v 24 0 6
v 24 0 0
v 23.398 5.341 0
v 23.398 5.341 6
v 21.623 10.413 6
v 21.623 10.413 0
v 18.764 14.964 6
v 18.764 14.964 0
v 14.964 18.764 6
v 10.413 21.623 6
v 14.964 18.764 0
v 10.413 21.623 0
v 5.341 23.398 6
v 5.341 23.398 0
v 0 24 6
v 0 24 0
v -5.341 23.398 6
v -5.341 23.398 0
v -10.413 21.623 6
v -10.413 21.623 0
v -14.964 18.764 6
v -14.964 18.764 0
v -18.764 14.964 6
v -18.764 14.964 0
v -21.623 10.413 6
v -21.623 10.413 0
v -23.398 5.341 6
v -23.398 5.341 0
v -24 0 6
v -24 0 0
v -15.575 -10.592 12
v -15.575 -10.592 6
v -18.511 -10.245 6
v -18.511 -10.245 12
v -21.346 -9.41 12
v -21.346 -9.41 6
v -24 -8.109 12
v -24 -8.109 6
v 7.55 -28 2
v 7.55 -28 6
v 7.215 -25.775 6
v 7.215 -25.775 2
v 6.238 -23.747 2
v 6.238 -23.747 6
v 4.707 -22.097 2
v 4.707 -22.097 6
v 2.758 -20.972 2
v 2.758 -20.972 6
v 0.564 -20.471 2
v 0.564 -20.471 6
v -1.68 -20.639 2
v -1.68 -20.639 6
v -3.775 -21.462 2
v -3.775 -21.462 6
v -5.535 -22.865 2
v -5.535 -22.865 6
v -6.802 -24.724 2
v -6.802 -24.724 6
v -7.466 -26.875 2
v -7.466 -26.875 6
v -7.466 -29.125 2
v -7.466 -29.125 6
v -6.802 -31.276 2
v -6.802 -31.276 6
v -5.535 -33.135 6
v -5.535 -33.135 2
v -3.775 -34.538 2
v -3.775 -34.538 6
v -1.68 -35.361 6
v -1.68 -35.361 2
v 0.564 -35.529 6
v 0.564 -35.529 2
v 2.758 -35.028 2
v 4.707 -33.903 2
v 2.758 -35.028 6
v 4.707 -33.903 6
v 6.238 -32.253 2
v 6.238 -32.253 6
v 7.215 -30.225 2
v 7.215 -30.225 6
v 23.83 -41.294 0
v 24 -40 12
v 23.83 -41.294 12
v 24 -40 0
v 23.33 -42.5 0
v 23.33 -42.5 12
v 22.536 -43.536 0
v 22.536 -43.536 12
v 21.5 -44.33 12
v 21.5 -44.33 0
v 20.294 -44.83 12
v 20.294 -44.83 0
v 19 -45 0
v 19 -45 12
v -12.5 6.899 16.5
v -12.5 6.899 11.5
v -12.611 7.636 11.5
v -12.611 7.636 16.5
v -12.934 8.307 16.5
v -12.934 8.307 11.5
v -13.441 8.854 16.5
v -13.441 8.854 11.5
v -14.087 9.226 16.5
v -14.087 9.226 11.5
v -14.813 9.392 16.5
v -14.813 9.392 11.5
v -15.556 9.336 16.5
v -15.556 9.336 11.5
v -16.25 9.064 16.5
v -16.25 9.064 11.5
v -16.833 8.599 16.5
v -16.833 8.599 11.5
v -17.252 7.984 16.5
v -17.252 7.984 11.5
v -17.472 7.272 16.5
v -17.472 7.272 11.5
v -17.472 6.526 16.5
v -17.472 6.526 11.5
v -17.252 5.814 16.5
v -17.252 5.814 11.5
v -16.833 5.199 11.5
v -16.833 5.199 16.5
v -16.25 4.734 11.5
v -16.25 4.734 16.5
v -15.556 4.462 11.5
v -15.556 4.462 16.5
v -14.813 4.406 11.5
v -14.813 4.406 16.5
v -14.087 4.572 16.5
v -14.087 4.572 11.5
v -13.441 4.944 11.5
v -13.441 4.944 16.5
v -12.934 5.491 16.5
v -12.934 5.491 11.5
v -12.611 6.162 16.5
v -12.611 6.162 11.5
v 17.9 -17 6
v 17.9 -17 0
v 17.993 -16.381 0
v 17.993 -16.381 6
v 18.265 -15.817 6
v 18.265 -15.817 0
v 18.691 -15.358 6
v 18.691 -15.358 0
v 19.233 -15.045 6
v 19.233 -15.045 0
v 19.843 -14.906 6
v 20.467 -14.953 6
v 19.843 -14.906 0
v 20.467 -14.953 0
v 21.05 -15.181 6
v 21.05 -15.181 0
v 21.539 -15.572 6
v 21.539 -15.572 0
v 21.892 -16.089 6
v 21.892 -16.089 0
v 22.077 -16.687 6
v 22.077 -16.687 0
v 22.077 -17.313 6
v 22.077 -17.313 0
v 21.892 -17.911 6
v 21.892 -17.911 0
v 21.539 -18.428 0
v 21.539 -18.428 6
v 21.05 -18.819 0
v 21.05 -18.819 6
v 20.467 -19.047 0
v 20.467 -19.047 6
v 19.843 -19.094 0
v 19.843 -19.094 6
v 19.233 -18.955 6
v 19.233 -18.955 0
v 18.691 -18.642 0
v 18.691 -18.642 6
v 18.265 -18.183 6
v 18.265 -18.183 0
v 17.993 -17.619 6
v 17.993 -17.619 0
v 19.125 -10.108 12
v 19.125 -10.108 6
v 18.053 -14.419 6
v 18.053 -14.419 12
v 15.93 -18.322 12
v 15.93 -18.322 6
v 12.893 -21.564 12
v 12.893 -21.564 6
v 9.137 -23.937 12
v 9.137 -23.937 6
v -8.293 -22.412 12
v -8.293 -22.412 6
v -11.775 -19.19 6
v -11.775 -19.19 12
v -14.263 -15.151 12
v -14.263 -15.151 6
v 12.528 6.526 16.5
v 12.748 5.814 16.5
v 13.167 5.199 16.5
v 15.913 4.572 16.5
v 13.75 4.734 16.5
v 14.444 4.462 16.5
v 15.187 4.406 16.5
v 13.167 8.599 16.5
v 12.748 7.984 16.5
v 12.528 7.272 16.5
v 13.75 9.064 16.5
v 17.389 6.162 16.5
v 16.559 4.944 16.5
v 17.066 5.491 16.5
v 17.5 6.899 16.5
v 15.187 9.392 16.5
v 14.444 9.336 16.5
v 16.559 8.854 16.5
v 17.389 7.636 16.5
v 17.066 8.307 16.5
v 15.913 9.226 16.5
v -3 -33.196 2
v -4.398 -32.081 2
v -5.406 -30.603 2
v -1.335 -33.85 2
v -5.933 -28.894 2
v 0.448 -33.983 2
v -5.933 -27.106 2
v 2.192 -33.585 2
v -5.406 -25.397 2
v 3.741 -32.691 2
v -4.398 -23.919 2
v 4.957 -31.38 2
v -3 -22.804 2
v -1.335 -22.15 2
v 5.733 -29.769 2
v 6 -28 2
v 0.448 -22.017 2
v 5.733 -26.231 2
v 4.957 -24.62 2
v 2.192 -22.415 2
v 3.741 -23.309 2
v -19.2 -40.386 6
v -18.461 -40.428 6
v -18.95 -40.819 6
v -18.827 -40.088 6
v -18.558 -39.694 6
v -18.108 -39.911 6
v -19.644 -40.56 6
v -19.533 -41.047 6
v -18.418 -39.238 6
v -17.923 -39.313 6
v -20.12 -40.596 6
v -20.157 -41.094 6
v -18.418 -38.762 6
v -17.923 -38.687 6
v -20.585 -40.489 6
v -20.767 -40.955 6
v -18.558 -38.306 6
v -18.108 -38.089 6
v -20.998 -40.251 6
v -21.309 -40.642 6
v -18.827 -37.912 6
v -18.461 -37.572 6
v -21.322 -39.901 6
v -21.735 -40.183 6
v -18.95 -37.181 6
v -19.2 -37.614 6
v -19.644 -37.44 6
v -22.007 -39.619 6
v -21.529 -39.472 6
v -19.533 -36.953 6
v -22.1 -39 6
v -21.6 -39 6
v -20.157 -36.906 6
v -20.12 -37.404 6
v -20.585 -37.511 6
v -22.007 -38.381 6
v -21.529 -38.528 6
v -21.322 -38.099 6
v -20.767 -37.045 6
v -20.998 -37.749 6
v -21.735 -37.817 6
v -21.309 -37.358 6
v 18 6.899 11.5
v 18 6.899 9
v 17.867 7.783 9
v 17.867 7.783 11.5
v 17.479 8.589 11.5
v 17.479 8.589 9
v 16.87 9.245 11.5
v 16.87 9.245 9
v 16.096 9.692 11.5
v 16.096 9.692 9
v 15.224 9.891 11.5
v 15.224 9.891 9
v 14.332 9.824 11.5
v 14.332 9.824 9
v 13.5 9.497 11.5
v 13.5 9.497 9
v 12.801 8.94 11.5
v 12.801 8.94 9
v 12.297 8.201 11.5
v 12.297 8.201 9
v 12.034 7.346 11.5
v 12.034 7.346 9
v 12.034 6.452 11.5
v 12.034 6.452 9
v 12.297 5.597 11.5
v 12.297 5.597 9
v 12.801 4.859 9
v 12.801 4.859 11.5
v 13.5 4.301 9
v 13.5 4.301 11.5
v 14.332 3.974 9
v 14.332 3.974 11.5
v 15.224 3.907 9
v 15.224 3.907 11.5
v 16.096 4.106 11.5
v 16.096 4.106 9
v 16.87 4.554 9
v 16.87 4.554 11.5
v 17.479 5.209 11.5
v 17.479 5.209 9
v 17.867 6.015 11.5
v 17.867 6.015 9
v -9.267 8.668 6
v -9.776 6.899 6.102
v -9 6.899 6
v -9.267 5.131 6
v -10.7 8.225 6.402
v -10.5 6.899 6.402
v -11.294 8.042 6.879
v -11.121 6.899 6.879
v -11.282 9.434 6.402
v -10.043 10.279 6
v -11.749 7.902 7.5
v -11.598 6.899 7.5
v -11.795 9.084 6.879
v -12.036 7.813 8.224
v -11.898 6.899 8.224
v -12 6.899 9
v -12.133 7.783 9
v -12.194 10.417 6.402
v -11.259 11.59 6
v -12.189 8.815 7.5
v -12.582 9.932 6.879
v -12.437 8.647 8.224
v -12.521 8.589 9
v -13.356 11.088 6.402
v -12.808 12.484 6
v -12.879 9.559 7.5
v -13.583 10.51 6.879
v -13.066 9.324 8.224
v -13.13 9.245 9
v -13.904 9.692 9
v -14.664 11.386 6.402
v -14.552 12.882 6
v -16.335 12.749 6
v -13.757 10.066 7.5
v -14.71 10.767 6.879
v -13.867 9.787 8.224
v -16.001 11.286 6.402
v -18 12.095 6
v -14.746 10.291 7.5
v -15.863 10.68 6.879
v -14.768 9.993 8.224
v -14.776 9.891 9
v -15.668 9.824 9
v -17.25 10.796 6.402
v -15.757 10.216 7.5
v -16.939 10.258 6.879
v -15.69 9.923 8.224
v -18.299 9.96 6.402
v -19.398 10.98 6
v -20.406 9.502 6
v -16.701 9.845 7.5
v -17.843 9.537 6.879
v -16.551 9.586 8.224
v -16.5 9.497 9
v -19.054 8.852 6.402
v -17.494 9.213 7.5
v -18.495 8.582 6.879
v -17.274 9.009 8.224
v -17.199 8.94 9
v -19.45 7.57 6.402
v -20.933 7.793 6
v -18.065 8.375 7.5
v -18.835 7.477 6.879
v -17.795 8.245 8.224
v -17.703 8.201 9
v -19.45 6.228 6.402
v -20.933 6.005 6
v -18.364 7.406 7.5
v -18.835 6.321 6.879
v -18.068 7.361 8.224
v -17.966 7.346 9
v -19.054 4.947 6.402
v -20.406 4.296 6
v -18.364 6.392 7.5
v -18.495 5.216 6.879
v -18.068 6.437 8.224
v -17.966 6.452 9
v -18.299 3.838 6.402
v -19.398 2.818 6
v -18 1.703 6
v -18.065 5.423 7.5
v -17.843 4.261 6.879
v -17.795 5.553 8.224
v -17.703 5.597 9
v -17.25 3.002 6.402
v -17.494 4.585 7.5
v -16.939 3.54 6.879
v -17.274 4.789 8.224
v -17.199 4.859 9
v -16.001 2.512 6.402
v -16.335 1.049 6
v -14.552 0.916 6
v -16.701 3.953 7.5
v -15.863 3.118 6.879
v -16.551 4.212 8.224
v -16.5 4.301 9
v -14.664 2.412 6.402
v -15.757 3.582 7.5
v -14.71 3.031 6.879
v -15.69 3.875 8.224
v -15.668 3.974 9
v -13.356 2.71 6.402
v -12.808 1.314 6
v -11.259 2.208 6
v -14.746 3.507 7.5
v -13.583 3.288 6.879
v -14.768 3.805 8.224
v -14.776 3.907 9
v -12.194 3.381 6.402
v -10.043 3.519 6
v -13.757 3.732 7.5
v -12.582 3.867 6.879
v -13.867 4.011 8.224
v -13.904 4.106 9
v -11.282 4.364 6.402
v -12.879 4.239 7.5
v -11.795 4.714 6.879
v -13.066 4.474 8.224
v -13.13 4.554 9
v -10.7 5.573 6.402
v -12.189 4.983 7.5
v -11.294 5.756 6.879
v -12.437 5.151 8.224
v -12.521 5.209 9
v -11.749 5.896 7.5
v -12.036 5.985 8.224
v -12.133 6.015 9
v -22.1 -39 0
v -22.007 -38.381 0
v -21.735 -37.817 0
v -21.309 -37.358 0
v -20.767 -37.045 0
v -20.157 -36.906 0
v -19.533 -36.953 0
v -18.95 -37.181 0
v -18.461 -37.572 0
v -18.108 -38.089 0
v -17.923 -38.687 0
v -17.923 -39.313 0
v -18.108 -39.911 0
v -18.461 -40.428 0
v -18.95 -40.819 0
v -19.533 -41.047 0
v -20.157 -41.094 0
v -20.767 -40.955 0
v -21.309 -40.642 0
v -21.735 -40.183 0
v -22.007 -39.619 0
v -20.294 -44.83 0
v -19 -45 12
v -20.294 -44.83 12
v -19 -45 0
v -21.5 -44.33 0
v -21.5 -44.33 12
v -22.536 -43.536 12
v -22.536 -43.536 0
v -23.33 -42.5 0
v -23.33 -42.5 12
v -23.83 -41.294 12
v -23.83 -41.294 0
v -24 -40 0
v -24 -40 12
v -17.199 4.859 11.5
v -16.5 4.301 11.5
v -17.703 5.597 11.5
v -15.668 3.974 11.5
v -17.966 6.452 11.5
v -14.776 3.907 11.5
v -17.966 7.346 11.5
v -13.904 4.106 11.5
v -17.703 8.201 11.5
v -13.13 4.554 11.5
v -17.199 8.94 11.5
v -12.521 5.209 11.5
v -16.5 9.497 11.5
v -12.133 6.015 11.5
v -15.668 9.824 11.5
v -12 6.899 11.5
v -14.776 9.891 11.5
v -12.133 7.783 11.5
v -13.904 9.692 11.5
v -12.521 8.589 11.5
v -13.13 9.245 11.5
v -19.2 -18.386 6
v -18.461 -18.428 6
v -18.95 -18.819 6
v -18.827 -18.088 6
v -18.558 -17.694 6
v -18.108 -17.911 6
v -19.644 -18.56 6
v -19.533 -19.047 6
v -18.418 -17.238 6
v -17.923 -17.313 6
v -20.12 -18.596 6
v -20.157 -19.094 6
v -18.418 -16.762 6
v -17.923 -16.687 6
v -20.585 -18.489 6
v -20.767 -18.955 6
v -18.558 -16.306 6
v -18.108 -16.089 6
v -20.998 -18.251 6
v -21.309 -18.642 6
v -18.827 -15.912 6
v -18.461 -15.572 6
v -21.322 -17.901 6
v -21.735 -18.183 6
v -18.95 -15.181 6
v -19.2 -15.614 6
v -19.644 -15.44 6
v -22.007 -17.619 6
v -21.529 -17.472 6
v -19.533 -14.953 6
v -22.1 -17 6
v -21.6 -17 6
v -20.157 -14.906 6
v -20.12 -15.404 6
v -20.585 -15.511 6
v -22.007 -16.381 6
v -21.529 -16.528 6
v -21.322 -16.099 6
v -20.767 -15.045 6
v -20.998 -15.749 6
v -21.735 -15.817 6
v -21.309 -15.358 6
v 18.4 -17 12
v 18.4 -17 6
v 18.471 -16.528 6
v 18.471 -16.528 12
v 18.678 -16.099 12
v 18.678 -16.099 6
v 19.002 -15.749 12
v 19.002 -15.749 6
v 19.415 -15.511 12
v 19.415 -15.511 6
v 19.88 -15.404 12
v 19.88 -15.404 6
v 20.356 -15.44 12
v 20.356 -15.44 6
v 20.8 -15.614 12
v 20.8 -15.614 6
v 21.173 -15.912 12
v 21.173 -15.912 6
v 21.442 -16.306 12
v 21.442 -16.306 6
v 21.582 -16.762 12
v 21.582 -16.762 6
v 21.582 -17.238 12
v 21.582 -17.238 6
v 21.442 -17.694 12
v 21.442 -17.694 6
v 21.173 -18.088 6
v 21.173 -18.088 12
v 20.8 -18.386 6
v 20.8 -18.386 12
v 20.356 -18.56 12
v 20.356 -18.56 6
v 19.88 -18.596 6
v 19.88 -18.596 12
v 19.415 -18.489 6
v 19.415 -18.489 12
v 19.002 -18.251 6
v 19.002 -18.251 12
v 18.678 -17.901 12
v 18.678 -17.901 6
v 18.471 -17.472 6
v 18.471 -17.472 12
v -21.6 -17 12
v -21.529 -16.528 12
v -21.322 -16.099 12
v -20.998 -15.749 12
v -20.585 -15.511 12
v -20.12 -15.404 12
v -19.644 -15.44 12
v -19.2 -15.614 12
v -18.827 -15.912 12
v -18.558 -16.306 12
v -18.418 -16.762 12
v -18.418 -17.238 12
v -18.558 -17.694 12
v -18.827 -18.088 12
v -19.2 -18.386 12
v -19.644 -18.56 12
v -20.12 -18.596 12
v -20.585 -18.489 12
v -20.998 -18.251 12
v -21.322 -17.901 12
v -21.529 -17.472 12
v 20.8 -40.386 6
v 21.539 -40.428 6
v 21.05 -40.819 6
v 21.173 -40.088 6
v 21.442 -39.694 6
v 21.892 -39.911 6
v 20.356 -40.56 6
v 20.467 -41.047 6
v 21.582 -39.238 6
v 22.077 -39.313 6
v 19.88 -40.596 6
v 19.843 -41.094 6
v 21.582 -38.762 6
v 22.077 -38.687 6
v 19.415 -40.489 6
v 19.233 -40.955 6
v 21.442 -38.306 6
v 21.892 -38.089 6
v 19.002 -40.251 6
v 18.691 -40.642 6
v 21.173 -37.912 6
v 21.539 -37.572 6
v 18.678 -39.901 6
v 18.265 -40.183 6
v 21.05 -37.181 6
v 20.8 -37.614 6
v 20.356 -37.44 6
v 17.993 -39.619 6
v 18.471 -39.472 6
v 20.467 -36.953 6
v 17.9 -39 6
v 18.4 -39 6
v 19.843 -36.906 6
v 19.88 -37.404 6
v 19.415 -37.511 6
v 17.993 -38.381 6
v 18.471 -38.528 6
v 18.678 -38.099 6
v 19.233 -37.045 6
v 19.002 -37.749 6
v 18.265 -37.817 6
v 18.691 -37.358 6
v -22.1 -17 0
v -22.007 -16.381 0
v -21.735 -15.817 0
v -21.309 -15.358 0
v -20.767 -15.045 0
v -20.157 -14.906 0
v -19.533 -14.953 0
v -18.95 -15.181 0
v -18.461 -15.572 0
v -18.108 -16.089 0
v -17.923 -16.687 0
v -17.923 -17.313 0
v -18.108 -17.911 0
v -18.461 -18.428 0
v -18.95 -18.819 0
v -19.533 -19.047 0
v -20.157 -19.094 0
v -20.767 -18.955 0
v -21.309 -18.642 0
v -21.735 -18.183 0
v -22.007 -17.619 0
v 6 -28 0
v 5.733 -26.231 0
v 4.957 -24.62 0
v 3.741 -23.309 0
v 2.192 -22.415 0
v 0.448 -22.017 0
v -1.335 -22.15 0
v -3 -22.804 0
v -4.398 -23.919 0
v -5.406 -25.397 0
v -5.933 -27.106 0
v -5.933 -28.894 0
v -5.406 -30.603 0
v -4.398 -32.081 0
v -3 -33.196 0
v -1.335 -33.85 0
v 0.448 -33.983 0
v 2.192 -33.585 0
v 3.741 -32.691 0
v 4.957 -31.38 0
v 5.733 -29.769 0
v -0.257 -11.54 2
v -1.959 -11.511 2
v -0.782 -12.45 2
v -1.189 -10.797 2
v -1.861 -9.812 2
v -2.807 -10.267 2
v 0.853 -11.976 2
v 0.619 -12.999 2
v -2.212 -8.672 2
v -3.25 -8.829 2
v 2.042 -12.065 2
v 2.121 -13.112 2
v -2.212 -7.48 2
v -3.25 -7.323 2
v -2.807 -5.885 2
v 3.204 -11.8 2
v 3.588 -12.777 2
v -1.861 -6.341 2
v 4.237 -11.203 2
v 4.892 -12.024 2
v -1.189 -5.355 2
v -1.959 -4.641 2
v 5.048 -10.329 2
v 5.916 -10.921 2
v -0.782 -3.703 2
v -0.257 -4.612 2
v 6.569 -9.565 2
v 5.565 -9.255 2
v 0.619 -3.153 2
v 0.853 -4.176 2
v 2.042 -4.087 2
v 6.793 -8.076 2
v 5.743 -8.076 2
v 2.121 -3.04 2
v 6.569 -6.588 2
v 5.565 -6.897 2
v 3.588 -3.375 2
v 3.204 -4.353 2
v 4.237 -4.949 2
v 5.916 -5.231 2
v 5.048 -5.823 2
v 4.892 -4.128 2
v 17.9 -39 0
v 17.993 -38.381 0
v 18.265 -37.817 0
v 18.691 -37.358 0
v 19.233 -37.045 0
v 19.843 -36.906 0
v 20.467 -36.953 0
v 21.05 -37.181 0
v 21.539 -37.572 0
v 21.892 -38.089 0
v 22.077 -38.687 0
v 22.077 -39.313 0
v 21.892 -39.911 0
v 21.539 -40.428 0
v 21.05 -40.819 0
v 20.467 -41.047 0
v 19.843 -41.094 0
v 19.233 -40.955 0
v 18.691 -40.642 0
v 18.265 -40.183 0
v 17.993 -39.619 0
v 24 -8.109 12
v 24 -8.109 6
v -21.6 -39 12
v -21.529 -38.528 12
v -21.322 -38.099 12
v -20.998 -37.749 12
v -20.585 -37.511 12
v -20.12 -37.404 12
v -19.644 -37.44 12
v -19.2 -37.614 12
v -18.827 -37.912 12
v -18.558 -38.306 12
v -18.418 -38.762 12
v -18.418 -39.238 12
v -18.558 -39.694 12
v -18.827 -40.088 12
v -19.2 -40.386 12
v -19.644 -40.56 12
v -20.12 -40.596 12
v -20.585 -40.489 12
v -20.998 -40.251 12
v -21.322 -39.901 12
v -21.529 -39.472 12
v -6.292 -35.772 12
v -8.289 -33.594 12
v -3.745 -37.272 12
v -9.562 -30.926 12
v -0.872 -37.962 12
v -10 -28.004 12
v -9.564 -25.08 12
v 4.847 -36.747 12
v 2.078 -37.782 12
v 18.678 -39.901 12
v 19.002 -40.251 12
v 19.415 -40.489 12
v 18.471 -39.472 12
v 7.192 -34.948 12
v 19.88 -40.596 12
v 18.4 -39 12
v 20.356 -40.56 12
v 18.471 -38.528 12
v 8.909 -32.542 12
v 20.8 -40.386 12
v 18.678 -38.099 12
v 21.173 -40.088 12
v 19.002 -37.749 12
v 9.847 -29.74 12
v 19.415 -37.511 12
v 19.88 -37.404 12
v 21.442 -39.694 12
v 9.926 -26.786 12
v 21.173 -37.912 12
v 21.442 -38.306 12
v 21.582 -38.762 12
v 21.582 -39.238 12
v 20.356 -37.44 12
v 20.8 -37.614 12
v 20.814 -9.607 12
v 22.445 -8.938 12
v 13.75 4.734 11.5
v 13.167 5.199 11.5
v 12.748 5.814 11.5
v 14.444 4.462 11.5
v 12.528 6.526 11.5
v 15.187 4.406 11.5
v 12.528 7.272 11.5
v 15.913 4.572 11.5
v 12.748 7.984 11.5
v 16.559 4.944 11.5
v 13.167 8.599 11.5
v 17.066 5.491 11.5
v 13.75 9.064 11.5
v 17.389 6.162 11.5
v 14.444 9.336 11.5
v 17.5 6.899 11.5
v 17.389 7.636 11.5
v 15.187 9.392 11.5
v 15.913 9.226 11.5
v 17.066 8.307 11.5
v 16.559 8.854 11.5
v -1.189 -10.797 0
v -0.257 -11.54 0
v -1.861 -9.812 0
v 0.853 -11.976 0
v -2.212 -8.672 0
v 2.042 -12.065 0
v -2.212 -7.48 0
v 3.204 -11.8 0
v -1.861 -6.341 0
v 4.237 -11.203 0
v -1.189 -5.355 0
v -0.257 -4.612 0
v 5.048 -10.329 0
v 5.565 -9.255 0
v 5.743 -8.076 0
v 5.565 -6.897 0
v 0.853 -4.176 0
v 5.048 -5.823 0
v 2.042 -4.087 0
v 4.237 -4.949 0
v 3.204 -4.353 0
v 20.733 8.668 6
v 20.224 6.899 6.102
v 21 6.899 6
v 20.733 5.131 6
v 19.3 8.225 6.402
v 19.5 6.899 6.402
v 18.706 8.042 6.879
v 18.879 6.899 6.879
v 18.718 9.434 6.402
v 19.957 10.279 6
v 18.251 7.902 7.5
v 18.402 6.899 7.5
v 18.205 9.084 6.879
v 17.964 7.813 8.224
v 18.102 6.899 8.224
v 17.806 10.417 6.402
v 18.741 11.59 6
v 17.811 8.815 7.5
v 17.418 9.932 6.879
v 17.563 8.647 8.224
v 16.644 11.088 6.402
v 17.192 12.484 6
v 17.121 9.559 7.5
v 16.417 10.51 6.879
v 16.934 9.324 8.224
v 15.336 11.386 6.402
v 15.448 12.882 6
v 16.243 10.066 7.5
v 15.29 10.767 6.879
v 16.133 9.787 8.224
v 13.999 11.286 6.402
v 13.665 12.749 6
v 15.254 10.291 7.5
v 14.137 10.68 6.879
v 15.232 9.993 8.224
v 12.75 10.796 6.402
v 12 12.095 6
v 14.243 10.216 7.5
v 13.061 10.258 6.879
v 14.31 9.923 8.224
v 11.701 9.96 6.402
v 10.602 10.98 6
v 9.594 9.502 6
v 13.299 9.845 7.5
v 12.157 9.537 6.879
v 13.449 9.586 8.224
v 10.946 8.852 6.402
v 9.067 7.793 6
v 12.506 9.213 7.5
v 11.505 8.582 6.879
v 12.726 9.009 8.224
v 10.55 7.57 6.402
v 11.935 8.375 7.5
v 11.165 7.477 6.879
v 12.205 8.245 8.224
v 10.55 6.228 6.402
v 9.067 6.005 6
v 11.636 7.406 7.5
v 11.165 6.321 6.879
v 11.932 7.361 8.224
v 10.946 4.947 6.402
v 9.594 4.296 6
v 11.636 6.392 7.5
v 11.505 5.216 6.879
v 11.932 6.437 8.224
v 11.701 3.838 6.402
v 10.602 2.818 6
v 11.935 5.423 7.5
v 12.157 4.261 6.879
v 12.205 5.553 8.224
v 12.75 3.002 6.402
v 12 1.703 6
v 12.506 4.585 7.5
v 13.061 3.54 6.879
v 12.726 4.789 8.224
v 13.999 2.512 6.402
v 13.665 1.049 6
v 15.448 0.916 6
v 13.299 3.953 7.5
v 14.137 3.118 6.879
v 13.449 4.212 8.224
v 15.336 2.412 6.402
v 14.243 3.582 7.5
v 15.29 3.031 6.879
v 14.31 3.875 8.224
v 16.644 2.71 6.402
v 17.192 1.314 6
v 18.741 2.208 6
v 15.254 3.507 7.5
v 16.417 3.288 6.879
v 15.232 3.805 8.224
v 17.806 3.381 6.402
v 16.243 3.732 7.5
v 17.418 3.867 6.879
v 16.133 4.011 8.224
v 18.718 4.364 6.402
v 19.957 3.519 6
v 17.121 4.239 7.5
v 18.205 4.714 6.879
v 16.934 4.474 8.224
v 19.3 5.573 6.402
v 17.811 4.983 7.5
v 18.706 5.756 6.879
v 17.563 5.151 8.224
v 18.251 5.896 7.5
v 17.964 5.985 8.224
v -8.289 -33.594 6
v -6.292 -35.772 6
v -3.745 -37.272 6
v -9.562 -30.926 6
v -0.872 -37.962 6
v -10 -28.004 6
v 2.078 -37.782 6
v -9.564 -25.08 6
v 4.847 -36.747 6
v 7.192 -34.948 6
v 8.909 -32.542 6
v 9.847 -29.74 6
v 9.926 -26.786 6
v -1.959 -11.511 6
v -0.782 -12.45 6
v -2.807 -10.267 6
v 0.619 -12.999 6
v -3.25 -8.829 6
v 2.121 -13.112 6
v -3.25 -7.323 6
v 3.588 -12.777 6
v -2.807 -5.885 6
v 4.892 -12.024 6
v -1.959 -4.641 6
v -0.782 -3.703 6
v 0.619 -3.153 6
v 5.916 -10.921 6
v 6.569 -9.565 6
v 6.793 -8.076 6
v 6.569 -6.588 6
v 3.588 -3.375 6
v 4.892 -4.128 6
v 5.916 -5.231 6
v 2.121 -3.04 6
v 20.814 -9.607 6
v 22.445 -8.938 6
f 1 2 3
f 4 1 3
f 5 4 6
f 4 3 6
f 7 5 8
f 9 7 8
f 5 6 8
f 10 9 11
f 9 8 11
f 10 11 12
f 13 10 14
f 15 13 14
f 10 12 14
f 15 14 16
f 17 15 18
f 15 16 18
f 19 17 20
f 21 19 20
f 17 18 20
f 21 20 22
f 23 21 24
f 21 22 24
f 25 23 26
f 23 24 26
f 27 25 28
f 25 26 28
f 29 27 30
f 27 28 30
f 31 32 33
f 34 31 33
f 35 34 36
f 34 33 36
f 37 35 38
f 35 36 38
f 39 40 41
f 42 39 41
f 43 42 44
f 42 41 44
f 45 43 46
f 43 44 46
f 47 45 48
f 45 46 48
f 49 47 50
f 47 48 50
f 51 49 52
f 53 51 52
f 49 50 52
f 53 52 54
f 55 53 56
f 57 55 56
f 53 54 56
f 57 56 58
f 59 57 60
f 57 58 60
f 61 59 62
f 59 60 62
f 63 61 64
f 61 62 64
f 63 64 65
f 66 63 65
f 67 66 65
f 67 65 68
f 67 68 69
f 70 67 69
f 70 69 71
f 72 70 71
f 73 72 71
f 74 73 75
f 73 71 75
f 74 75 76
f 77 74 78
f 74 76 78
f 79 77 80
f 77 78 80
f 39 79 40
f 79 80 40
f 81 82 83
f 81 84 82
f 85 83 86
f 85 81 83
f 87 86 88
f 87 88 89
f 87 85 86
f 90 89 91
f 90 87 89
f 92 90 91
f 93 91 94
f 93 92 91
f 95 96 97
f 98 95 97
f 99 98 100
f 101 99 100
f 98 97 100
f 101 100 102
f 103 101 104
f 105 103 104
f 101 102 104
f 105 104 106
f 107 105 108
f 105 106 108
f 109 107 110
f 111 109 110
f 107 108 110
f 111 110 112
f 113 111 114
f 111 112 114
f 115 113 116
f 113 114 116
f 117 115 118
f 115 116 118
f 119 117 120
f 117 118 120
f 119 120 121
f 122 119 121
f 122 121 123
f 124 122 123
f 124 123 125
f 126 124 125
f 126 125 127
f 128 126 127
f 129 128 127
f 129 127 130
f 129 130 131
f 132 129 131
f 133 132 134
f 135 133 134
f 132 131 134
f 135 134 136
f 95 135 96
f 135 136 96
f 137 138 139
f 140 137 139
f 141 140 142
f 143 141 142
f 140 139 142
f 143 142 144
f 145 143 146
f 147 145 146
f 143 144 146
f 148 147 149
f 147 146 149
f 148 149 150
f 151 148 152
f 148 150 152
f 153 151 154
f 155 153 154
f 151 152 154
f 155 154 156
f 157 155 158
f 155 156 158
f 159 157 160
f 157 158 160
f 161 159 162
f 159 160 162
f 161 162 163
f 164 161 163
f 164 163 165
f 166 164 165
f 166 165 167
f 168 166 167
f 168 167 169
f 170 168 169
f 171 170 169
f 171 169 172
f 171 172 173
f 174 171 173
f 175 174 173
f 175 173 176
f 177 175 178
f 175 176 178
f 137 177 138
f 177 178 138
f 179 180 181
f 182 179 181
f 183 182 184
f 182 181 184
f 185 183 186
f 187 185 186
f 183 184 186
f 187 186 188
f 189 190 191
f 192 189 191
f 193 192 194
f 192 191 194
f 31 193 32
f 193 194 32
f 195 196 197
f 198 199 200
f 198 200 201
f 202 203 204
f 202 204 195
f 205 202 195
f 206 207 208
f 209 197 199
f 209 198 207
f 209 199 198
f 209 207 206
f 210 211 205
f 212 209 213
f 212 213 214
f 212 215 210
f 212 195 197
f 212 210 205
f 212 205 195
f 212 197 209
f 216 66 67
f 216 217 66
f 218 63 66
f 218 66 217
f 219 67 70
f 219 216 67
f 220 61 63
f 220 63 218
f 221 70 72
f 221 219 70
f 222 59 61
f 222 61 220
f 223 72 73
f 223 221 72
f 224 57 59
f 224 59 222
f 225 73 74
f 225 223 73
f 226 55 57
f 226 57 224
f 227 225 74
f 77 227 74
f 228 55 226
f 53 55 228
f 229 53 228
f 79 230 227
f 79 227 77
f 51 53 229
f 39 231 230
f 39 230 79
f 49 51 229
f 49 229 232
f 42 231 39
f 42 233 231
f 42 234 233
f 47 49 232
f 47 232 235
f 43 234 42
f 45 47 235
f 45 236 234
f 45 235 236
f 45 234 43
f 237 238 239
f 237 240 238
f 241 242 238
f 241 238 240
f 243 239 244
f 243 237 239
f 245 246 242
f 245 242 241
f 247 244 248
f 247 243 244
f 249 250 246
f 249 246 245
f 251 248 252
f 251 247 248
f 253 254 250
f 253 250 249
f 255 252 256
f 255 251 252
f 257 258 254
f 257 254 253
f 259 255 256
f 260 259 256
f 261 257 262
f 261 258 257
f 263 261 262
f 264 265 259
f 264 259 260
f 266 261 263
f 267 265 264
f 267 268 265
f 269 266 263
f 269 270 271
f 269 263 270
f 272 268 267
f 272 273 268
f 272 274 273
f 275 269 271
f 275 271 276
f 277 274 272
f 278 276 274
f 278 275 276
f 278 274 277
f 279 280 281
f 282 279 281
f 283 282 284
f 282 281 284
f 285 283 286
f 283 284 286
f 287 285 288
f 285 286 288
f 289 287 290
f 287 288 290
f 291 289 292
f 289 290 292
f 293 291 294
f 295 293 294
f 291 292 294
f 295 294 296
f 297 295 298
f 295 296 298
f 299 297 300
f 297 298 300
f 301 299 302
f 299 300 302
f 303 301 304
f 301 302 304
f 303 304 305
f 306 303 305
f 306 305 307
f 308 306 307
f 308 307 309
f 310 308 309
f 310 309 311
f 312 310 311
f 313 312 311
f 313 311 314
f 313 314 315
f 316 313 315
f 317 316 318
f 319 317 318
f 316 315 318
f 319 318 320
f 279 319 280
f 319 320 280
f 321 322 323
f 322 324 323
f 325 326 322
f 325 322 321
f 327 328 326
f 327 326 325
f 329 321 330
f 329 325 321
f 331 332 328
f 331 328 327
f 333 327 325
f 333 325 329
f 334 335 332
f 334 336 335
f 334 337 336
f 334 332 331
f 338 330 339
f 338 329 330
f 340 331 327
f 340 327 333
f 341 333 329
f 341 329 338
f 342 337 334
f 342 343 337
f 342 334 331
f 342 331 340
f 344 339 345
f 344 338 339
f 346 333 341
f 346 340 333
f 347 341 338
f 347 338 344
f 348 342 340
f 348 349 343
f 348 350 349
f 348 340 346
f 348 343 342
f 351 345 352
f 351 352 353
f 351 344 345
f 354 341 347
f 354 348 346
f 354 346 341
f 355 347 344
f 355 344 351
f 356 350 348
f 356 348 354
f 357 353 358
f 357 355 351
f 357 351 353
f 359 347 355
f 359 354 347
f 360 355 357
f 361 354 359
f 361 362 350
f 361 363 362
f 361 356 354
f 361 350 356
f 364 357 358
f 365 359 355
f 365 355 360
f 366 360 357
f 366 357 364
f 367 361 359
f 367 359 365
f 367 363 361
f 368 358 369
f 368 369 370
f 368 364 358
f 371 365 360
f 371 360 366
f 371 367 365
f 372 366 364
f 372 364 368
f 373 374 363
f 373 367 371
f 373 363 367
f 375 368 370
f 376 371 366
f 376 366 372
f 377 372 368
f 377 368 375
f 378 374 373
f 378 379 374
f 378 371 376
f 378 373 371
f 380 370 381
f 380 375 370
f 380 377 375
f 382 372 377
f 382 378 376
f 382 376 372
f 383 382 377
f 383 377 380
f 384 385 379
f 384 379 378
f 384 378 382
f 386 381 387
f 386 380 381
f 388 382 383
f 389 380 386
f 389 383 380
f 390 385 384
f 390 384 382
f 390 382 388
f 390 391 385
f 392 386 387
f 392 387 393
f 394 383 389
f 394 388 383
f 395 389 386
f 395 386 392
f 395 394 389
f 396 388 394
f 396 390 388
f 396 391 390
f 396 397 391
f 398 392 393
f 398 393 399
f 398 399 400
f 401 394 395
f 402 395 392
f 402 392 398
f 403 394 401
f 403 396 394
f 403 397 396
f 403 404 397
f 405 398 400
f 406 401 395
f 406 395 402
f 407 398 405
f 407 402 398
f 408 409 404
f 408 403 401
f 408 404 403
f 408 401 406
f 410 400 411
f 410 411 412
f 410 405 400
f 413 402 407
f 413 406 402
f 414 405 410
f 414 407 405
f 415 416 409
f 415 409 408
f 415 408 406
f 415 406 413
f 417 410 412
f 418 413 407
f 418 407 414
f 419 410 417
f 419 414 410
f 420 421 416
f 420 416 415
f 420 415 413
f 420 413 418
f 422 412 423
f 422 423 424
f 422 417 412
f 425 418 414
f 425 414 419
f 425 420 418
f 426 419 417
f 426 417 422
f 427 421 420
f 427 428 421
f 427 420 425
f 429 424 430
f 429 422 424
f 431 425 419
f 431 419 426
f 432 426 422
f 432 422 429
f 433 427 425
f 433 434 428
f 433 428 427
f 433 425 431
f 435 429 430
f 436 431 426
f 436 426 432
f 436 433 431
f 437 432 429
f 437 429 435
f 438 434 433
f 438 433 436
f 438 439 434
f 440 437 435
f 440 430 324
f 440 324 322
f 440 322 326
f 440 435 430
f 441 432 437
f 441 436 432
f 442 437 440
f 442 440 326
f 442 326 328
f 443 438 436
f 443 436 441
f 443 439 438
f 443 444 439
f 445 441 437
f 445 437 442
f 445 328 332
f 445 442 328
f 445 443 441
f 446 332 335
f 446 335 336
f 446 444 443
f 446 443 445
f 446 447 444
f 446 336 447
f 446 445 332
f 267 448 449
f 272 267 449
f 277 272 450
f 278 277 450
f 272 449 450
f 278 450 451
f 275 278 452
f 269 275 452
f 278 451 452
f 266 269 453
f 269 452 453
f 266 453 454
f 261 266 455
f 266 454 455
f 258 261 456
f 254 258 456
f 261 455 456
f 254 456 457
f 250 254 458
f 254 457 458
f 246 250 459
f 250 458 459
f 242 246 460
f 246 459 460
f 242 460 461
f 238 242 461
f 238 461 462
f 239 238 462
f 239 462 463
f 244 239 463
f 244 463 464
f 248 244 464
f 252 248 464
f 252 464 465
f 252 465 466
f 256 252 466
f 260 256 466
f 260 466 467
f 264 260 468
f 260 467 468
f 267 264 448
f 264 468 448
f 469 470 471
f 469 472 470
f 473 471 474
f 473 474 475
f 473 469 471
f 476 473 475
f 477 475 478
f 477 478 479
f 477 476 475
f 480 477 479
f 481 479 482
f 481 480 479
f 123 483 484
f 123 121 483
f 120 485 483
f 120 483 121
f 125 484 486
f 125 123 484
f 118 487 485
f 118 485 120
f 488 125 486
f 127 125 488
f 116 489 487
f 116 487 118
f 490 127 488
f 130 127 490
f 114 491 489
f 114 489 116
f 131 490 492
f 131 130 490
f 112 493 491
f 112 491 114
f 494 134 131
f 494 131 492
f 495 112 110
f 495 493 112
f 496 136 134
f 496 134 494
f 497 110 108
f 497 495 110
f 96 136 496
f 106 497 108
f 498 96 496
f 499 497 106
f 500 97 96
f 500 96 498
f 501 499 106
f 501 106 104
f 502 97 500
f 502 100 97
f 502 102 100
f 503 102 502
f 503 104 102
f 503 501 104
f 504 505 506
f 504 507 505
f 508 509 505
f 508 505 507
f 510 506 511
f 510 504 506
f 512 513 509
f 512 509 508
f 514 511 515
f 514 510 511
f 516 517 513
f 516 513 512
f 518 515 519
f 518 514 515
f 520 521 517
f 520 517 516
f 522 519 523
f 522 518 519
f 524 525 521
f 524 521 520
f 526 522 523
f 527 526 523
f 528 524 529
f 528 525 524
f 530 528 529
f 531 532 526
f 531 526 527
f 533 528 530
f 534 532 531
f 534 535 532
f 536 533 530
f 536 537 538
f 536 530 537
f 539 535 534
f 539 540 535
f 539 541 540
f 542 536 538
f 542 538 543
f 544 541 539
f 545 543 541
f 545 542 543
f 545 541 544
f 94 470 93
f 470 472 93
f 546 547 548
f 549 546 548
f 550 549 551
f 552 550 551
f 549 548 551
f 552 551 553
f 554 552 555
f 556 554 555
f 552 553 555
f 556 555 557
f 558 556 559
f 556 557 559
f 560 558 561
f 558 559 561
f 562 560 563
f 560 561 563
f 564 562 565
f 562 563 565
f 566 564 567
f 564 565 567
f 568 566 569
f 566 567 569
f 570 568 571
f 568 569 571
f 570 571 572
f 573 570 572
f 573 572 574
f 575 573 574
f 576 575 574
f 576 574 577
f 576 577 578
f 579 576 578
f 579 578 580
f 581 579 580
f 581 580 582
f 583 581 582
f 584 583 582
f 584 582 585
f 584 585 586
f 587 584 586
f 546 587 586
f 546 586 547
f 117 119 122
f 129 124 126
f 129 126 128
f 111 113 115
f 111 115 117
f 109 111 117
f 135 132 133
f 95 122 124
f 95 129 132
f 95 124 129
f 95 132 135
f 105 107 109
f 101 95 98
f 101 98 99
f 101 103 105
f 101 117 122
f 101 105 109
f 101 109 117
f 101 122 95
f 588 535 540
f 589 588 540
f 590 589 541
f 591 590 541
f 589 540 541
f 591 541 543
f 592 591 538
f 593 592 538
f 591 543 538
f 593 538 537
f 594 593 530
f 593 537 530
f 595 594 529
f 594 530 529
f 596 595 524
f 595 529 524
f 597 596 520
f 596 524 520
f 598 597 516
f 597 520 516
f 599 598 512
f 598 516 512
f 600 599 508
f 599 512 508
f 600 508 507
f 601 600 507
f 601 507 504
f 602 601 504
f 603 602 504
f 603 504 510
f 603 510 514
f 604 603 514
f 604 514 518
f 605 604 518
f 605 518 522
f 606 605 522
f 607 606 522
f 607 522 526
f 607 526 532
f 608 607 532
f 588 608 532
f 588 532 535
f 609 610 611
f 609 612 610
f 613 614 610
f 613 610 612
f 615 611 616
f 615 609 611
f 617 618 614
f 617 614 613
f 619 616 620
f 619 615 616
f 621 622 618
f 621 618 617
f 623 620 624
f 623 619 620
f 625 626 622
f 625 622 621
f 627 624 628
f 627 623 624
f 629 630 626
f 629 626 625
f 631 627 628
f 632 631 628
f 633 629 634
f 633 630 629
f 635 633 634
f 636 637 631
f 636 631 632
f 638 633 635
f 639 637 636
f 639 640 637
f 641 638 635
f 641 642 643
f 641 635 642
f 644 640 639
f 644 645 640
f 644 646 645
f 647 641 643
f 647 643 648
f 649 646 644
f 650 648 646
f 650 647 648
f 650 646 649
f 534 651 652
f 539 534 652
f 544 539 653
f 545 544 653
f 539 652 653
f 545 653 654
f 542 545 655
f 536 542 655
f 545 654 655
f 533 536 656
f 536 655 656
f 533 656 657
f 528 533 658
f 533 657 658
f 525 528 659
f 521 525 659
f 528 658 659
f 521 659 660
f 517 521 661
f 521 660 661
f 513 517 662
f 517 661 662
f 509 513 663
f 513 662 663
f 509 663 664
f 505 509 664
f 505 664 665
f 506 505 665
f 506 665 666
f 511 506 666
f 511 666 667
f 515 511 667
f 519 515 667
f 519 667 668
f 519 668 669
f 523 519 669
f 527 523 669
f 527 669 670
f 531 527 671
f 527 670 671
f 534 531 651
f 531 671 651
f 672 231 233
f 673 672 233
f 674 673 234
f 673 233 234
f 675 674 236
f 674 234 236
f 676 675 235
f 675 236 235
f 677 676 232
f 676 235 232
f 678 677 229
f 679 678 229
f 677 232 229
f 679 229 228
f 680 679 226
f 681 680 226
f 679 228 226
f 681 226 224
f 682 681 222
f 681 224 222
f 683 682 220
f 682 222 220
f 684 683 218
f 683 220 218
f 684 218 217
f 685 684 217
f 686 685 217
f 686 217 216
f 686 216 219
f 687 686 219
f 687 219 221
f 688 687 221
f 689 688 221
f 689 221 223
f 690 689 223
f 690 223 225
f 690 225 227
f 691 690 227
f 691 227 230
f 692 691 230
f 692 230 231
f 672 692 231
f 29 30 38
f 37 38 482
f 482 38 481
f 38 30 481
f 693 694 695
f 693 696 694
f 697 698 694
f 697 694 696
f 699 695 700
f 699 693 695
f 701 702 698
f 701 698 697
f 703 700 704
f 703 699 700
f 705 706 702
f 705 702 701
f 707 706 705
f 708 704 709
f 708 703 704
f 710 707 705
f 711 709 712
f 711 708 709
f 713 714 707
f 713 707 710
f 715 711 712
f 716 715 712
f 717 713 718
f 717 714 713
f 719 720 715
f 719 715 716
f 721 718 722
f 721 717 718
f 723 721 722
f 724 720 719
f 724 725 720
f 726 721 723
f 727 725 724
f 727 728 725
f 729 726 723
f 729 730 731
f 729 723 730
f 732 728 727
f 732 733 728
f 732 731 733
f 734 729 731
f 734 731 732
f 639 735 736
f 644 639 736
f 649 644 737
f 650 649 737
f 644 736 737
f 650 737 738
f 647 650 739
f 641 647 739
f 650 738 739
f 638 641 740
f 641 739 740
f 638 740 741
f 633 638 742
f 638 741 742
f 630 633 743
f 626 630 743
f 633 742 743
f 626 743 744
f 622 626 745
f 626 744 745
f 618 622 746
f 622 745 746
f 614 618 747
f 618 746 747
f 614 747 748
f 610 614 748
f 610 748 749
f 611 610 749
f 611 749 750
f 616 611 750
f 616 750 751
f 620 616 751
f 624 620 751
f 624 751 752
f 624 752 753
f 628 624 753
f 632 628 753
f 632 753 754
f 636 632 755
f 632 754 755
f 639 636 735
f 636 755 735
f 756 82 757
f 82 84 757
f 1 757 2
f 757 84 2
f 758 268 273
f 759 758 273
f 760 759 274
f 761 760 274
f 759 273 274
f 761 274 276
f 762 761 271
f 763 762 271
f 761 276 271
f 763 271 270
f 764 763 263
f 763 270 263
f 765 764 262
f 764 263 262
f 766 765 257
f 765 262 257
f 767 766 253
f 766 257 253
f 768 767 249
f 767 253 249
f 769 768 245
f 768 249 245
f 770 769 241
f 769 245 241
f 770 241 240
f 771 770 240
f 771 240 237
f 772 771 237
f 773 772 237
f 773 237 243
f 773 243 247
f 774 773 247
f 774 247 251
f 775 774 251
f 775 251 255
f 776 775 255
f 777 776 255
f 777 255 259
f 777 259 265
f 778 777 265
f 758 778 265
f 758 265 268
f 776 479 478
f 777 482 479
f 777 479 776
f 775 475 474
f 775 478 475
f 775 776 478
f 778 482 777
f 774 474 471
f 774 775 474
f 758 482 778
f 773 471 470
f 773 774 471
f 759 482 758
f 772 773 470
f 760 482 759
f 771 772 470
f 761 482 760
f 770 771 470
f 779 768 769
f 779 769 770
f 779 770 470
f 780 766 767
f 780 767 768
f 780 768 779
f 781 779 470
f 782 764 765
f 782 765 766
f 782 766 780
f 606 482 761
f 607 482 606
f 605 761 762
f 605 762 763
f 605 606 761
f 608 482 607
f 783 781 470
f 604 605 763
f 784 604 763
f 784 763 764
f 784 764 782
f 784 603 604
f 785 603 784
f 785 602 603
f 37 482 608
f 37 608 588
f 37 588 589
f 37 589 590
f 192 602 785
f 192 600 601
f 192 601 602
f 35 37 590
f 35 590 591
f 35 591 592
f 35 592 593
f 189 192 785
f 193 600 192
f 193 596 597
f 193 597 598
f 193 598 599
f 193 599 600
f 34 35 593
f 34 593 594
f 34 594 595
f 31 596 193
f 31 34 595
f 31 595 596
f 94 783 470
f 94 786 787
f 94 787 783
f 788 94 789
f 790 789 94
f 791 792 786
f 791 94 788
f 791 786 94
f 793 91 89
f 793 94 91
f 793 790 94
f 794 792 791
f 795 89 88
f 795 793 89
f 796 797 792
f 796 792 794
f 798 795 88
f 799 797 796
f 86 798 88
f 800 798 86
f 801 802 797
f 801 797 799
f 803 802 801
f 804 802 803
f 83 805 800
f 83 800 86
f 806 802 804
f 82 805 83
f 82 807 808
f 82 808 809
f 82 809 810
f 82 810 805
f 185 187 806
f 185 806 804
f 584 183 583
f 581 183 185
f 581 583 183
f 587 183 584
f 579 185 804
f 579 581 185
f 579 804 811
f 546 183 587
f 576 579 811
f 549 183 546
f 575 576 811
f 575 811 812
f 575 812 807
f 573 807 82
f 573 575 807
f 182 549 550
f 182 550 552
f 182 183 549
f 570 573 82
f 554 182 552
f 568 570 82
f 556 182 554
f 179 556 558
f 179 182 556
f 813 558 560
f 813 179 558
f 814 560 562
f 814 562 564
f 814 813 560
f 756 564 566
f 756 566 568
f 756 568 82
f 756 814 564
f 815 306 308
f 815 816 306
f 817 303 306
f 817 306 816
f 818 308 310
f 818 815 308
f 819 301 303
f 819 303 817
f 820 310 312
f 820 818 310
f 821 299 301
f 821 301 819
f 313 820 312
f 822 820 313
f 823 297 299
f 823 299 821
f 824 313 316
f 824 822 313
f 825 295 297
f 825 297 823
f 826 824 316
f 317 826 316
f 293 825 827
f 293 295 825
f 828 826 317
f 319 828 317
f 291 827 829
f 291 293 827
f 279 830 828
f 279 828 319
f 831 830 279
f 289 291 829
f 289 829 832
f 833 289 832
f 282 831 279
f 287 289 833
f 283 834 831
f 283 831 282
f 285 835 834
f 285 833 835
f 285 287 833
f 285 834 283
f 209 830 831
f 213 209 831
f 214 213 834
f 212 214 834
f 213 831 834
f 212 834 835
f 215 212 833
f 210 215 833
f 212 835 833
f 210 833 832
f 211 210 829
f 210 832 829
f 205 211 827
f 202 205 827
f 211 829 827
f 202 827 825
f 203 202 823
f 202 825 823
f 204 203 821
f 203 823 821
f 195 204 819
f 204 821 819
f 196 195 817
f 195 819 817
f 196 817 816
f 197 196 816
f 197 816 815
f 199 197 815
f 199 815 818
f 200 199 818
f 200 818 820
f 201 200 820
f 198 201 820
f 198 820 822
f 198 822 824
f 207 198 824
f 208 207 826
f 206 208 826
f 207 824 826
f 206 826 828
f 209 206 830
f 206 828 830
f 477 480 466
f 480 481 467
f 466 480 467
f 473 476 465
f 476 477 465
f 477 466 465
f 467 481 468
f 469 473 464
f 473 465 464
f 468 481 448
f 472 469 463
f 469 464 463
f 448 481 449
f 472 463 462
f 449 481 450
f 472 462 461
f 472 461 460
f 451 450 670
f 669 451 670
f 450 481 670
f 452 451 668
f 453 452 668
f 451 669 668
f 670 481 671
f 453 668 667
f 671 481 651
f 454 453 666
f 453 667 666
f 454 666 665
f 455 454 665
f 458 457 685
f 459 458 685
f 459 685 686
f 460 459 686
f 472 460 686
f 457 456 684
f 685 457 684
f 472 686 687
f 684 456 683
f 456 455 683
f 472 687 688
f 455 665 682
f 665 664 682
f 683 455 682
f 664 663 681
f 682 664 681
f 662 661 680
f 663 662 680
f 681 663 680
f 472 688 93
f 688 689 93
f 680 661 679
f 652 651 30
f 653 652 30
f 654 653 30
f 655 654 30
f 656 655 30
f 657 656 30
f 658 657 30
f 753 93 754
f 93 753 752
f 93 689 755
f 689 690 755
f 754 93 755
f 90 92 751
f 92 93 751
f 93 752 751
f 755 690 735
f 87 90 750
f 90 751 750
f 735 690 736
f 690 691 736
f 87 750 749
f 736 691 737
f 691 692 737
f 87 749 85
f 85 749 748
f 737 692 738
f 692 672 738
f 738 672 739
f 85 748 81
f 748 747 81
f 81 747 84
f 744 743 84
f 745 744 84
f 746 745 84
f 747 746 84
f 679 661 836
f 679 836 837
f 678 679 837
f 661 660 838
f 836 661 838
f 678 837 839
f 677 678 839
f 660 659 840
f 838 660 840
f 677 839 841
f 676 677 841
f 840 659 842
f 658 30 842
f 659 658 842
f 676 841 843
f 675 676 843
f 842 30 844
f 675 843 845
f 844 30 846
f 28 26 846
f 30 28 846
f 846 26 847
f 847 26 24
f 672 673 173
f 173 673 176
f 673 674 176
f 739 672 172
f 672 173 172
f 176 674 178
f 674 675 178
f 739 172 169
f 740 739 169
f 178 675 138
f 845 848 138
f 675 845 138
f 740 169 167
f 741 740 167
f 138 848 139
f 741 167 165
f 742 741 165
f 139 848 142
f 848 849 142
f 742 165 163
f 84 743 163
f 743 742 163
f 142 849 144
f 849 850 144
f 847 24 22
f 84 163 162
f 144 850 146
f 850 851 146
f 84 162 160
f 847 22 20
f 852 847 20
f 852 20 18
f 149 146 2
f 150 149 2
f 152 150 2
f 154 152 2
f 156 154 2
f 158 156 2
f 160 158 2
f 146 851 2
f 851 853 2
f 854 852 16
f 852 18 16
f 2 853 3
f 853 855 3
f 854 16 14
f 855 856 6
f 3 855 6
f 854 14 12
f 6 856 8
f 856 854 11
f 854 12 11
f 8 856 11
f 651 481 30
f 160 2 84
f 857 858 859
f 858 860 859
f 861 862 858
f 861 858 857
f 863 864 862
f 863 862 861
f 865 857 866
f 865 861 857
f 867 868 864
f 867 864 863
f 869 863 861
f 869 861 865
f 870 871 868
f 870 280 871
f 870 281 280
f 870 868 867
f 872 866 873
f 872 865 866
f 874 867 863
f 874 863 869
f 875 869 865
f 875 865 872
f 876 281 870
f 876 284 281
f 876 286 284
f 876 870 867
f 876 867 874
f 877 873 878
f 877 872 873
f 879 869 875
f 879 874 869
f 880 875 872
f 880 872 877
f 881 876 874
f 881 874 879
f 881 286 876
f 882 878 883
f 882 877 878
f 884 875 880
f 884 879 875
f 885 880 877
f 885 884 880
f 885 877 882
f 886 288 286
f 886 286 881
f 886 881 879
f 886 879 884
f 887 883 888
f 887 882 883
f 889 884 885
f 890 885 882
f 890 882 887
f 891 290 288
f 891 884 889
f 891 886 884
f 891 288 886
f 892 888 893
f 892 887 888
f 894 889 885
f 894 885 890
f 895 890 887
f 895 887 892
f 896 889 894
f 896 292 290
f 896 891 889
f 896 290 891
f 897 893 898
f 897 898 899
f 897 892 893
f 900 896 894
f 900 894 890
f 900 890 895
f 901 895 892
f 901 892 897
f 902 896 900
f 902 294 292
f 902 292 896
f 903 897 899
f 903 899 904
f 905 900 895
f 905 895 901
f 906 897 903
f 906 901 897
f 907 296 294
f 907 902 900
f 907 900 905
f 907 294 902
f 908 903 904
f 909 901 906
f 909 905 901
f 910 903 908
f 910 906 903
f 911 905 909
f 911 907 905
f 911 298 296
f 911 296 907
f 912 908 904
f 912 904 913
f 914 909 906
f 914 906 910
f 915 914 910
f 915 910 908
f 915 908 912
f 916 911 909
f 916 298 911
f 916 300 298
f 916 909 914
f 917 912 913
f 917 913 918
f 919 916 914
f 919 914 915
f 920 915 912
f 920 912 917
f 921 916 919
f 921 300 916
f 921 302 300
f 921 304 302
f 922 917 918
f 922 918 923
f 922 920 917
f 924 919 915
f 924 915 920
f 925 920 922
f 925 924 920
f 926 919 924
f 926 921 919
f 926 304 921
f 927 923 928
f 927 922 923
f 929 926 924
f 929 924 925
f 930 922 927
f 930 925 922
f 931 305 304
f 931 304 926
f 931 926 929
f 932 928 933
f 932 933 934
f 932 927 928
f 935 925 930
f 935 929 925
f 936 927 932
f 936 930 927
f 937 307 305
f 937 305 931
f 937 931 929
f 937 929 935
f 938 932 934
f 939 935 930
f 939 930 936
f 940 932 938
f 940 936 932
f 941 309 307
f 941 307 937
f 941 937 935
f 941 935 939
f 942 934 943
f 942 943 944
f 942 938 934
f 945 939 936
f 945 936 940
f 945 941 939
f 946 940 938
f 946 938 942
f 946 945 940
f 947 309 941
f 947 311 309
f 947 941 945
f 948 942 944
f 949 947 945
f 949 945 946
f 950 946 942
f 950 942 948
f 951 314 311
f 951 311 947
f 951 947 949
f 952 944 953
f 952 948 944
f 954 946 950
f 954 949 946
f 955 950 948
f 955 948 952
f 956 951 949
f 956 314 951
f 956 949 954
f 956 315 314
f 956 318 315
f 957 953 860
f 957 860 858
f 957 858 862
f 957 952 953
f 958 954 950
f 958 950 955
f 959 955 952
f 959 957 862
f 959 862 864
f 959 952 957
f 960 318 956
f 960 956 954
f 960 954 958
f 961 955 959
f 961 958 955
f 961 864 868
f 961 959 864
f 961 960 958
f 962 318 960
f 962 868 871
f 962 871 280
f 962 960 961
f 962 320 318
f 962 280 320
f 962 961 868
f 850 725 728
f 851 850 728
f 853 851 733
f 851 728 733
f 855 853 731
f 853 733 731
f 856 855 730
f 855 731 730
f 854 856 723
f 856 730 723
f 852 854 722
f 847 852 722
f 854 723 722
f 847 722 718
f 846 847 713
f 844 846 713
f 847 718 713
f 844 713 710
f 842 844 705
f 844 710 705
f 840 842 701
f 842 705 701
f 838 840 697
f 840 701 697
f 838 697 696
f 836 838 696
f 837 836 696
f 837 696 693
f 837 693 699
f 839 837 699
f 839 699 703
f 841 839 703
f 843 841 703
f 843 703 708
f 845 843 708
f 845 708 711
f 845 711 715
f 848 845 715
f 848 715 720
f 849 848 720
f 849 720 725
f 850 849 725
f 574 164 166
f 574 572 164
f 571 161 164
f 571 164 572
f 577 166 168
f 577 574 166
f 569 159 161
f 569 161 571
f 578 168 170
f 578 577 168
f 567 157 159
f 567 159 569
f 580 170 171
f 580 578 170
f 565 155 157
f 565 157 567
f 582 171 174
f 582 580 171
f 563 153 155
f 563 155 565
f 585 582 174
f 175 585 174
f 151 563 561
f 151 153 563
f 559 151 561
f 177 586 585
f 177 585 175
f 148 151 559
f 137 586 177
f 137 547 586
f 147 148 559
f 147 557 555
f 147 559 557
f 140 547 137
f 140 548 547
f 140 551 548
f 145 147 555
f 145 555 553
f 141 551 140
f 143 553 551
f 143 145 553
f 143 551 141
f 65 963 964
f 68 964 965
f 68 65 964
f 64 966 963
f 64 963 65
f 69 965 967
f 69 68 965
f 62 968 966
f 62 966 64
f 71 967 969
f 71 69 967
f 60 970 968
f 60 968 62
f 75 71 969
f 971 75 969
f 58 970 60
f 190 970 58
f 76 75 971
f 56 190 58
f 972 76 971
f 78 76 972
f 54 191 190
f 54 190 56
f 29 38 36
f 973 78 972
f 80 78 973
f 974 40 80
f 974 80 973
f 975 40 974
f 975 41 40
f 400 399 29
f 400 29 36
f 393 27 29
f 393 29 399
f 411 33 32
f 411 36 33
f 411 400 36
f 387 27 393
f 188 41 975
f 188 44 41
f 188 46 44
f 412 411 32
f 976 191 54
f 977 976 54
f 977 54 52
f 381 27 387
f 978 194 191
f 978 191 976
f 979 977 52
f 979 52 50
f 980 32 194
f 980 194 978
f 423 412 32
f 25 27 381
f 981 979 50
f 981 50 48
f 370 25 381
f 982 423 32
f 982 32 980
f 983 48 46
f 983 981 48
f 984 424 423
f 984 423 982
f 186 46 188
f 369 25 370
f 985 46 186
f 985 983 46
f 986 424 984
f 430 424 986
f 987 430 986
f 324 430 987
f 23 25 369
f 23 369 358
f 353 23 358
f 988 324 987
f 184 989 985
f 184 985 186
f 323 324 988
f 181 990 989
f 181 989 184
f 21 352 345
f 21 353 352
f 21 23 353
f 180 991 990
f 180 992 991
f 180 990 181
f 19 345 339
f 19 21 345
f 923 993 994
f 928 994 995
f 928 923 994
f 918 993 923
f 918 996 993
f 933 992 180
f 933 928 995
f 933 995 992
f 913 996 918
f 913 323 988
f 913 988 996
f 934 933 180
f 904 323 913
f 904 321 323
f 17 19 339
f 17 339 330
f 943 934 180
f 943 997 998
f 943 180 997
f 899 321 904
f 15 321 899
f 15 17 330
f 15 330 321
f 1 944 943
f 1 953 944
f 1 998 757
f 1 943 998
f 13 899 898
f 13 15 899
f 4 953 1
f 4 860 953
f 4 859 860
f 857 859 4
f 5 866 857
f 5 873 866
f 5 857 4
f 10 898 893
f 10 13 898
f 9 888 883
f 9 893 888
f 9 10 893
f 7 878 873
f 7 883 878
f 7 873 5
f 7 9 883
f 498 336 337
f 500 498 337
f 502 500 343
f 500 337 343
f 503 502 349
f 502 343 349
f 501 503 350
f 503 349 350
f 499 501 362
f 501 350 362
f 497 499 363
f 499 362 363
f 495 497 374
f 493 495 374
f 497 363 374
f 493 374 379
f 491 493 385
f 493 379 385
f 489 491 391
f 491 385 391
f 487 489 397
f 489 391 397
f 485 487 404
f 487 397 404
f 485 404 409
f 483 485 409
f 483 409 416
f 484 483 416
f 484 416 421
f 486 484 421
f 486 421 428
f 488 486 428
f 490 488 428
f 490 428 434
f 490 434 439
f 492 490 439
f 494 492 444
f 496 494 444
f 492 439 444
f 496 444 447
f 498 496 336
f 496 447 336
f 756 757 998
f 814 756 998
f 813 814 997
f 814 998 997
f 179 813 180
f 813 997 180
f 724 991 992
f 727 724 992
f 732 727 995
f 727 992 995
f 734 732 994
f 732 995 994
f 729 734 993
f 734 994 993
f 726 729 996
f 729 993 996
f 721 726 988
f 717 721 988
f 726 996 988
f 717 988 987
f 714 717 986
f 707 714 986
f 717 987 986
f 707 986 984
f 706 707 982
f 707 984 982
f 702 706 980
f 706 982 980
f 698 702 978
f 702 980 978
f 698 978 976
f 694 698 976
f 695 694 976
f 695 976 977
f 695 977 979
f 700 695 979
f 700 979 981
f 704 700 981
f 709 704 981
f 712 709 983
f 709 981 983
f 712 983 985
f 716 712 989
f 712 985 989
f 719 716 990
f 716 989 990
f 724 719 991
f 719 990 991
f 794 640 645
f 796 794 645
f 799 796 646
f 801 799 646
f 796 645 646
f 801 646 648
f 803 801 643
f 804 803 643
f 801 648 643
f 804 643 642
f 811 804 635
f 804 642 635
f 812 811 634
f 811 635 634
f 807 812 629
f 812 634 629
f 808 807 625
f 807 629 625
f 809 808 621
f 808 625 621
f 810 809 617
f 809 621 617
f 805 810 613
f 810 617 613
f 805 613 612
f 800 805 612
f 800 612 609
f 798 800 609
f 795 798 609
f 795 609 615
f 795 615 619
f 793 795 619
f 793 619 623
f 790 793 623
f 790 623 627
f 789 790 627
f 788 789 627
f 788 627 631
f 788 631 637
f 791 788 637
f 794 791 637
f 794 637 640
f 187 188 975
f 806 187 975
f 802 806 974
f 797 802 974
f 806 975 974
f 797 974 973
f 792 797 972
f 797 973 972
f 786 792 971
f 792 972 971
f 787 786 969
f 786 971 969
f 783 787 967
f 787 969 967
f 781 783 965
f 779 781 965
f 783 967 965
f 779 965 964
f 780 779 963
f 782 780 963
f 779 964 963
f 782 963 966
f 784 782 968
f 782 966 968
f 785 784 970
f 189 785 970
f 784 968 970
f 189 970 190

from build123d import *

# Parameters (mm, degrees)
EXTRUDE_1_DEPTH     = 6
SKETCH_3_R          = 3
EXTRUDE_2_DEPTH     = 5.5
SKETCH_4_R          = 2.5
EXTRUDE_3_DEPTH     = 5
SKETCH_5_R          = 5.05
CUT_EXTRUDE_1_DEPTH = 4
SKETCH_6_R          = 4
CUT_EXTRUDE_2_DEPTH = 3
SKETCH_7_R          = 7.55
CUT_EXTRUDE_3_DEPTH = 4
SKETCH_8_R          = 6
CUT_EXTRUDE_4_DEPTH = 3
FILLET_1_R          = 3
EXTRUDE_4_DEPTH     = 6
SKETCH_10_R         = 1.6
CUT_EXTRUDE_5_DEPTH = 17.5
SKETCH_11_R         = 2.1
CUT_EXTRUDE_6_DEPTH = 6
FILLET_2_R          = 5


with BuildPart() as part:
    # 草图1 → 凸台-拉伸1 (new body)
    with BuildSketch(Plane.XY):
        with BuildLine():
            Line((-24, 0), (-24, -45))
            Line((-24, -45), (24, -45))
            Line((24, -45), (24, 0))
            ThreePointArc((24, 0), (0, 24), (-24, 0))
        make_face()
    extrude(amount=EXTRUDE_1_DEPTH)

    # 草图3 → 凸台-拉伸2 (add)
    with BuildSketch(Plane.XY.offset(6)):
        with Locations((-15, 6.899039913)):
            Circle(SKETCH_3_R)
        with Locations((15, 6.899039913)):
            Circle(SKETCH_3_R)
    extrude(amount=EXTRUDE_2_DEPTH)

    # 草图4 → 凸台-拉伸3 (add)
    with BuildSketch(Plane.XY.offset(11.5)):
        with Locations((-15, 6.899039913)):
            Circle(SKETCH_4_R)
        with Locations((15, 6.899039913)):
            Circle(SKETCH_4_R)
    extrude(amount=EXTRUDE_3_DEPTH)

    # 草图5 → 切除-拉伸1 (cut)
    with BuildSketch(Plane.XY.offset(6)):
        with Locations((1.743114855, -8.076106038)):
            Circle(SKETCH_5_R)
    extrude(amount=-CUT_EXTRUDE_1_DEPTH, mode=Mode.SUBTRACT)

    # 草图6 → 切除-拉伸2 (cut, through all)
    with BuildSketch(Plane.XY.offset(2)):
        with Locations((1.743114855, -8.076106038)):
            Circle(SKETCH_6_R)
    extrude(amount=-CUT_EXTRUDE_2_DEPTH, mode=Mode.SUBTRACT)

    # 草图7 → 切除-拉伸3 (cut)
    with BuildSketch(Plane.XY.offset(6)):
        with Locations((0, -28)):
            Circle(SKETCH_7_R)
    extrude(amount=-CUT_EXTRUDE_3_DEPTH, mode=Mode.SUBTRACT)

    # 草图8 → 切除-拉伸4 (cut, through all)
    with BuildSketch(Plane.XY.offset(2)):
        with Locations((0, -28)):
            Circle(SKETCH_8_R)
    extrude(amount=-CUT_EXTRUDE_4_DEPTH, mode=Mode.SUBTRACT)

    # 圆角1
    fillet_1_edges = [part.edges().sort_by_distance(p)[0] for p in [
        (-18, 6.899039913, 6),
        (12, 6.899039913, 6),
    ]]
    fillet(fillet_1_edges, radius=FILLET_1_R)

    # 草图9 → 凸台-拉伸4 (add)
    with BuildSketch(Plane.XY.offset(6)):
        with BuildLine():
            Line((24, -45), (24, -8.109291107))
            ThreePointArc((24, -8.109291107), (21.638033238, -9.293134578), (19.124765434, -10.107908964))
            ThreePointArc((19.124765434, -10.107908964), (15.930250057, -18.32184636), (9.137474346, -23.93717308))
            ThreePointArc((9.137474346, -23.93717308), (-0.871557427, -37.961946981), (-8.293153088, -22.412190782))
            ThreePointArc((-8.293153088, -22.412190782), (-13.156547867, -17.254888679), (-15.575163477, -10.591505733))
            ThreePointArc((-15.575163477, -10.591505733), (-19.945835244, -9.887523575), (-24, -8.109291107))
            Line((-24, -8.109291107), (-24, -45))
            Line((-24, -45), (24, -45))
        make_face()
    extrude(amount=EXTRUDE_4_DEPTH)

    # 草图10 → 切除-拉伸5 (cut, through all)
    with BuildSketch(Plane(origin=(0, 0, 0), x_dir=(-1, 0, 0), z_dir=(0, 0, -1))):
        with Locations((-20, -39)):
            Circle(SKETCH_10_R)
        with Locations((-20, -17)):
            Circle(SKETCH_10_R)
        with Locations((20, -39)):
            Circle(SKETCH_10_R)
        with Locations((20, -17)):
            Circle(SKETCH_10_R)
    extrude(amount=-CUT_EXTRUDE_5_DEPTH, mode=Mode.SUBTRACT)

    # 草图11 → 切除-拉伸6 (cut)
    with BuildSketch(Plane(origin=(0, 0, 0), x_dir=(-1, 0, 0), z_dir=(0, 0, -1))):
        with Locations((-20, -17)):
            Circle(SKETCH_11_R)
        with Locations((-20, -39)):
            Circle(SKETCH_11_R)
        with Locations((20, -17)):
            Circle(SKETCH_11_R)
        with Locations((20, -39)):
            Circle(SKETCH_11_R)
    extrude(amount=-CUT_EXTRUDE_6_DEPTH, mode=Mode.SUBTRACT)

    # 圆角2
    fillet_2_edges = [part.edges().sort_by_distance(p)[0] for p in [
        (24, -45, 6),
        (-24, -45, 6),
    ]]
    fillet(fillet_2_edges, radius=FILLET_2_R)


solid = part.part
